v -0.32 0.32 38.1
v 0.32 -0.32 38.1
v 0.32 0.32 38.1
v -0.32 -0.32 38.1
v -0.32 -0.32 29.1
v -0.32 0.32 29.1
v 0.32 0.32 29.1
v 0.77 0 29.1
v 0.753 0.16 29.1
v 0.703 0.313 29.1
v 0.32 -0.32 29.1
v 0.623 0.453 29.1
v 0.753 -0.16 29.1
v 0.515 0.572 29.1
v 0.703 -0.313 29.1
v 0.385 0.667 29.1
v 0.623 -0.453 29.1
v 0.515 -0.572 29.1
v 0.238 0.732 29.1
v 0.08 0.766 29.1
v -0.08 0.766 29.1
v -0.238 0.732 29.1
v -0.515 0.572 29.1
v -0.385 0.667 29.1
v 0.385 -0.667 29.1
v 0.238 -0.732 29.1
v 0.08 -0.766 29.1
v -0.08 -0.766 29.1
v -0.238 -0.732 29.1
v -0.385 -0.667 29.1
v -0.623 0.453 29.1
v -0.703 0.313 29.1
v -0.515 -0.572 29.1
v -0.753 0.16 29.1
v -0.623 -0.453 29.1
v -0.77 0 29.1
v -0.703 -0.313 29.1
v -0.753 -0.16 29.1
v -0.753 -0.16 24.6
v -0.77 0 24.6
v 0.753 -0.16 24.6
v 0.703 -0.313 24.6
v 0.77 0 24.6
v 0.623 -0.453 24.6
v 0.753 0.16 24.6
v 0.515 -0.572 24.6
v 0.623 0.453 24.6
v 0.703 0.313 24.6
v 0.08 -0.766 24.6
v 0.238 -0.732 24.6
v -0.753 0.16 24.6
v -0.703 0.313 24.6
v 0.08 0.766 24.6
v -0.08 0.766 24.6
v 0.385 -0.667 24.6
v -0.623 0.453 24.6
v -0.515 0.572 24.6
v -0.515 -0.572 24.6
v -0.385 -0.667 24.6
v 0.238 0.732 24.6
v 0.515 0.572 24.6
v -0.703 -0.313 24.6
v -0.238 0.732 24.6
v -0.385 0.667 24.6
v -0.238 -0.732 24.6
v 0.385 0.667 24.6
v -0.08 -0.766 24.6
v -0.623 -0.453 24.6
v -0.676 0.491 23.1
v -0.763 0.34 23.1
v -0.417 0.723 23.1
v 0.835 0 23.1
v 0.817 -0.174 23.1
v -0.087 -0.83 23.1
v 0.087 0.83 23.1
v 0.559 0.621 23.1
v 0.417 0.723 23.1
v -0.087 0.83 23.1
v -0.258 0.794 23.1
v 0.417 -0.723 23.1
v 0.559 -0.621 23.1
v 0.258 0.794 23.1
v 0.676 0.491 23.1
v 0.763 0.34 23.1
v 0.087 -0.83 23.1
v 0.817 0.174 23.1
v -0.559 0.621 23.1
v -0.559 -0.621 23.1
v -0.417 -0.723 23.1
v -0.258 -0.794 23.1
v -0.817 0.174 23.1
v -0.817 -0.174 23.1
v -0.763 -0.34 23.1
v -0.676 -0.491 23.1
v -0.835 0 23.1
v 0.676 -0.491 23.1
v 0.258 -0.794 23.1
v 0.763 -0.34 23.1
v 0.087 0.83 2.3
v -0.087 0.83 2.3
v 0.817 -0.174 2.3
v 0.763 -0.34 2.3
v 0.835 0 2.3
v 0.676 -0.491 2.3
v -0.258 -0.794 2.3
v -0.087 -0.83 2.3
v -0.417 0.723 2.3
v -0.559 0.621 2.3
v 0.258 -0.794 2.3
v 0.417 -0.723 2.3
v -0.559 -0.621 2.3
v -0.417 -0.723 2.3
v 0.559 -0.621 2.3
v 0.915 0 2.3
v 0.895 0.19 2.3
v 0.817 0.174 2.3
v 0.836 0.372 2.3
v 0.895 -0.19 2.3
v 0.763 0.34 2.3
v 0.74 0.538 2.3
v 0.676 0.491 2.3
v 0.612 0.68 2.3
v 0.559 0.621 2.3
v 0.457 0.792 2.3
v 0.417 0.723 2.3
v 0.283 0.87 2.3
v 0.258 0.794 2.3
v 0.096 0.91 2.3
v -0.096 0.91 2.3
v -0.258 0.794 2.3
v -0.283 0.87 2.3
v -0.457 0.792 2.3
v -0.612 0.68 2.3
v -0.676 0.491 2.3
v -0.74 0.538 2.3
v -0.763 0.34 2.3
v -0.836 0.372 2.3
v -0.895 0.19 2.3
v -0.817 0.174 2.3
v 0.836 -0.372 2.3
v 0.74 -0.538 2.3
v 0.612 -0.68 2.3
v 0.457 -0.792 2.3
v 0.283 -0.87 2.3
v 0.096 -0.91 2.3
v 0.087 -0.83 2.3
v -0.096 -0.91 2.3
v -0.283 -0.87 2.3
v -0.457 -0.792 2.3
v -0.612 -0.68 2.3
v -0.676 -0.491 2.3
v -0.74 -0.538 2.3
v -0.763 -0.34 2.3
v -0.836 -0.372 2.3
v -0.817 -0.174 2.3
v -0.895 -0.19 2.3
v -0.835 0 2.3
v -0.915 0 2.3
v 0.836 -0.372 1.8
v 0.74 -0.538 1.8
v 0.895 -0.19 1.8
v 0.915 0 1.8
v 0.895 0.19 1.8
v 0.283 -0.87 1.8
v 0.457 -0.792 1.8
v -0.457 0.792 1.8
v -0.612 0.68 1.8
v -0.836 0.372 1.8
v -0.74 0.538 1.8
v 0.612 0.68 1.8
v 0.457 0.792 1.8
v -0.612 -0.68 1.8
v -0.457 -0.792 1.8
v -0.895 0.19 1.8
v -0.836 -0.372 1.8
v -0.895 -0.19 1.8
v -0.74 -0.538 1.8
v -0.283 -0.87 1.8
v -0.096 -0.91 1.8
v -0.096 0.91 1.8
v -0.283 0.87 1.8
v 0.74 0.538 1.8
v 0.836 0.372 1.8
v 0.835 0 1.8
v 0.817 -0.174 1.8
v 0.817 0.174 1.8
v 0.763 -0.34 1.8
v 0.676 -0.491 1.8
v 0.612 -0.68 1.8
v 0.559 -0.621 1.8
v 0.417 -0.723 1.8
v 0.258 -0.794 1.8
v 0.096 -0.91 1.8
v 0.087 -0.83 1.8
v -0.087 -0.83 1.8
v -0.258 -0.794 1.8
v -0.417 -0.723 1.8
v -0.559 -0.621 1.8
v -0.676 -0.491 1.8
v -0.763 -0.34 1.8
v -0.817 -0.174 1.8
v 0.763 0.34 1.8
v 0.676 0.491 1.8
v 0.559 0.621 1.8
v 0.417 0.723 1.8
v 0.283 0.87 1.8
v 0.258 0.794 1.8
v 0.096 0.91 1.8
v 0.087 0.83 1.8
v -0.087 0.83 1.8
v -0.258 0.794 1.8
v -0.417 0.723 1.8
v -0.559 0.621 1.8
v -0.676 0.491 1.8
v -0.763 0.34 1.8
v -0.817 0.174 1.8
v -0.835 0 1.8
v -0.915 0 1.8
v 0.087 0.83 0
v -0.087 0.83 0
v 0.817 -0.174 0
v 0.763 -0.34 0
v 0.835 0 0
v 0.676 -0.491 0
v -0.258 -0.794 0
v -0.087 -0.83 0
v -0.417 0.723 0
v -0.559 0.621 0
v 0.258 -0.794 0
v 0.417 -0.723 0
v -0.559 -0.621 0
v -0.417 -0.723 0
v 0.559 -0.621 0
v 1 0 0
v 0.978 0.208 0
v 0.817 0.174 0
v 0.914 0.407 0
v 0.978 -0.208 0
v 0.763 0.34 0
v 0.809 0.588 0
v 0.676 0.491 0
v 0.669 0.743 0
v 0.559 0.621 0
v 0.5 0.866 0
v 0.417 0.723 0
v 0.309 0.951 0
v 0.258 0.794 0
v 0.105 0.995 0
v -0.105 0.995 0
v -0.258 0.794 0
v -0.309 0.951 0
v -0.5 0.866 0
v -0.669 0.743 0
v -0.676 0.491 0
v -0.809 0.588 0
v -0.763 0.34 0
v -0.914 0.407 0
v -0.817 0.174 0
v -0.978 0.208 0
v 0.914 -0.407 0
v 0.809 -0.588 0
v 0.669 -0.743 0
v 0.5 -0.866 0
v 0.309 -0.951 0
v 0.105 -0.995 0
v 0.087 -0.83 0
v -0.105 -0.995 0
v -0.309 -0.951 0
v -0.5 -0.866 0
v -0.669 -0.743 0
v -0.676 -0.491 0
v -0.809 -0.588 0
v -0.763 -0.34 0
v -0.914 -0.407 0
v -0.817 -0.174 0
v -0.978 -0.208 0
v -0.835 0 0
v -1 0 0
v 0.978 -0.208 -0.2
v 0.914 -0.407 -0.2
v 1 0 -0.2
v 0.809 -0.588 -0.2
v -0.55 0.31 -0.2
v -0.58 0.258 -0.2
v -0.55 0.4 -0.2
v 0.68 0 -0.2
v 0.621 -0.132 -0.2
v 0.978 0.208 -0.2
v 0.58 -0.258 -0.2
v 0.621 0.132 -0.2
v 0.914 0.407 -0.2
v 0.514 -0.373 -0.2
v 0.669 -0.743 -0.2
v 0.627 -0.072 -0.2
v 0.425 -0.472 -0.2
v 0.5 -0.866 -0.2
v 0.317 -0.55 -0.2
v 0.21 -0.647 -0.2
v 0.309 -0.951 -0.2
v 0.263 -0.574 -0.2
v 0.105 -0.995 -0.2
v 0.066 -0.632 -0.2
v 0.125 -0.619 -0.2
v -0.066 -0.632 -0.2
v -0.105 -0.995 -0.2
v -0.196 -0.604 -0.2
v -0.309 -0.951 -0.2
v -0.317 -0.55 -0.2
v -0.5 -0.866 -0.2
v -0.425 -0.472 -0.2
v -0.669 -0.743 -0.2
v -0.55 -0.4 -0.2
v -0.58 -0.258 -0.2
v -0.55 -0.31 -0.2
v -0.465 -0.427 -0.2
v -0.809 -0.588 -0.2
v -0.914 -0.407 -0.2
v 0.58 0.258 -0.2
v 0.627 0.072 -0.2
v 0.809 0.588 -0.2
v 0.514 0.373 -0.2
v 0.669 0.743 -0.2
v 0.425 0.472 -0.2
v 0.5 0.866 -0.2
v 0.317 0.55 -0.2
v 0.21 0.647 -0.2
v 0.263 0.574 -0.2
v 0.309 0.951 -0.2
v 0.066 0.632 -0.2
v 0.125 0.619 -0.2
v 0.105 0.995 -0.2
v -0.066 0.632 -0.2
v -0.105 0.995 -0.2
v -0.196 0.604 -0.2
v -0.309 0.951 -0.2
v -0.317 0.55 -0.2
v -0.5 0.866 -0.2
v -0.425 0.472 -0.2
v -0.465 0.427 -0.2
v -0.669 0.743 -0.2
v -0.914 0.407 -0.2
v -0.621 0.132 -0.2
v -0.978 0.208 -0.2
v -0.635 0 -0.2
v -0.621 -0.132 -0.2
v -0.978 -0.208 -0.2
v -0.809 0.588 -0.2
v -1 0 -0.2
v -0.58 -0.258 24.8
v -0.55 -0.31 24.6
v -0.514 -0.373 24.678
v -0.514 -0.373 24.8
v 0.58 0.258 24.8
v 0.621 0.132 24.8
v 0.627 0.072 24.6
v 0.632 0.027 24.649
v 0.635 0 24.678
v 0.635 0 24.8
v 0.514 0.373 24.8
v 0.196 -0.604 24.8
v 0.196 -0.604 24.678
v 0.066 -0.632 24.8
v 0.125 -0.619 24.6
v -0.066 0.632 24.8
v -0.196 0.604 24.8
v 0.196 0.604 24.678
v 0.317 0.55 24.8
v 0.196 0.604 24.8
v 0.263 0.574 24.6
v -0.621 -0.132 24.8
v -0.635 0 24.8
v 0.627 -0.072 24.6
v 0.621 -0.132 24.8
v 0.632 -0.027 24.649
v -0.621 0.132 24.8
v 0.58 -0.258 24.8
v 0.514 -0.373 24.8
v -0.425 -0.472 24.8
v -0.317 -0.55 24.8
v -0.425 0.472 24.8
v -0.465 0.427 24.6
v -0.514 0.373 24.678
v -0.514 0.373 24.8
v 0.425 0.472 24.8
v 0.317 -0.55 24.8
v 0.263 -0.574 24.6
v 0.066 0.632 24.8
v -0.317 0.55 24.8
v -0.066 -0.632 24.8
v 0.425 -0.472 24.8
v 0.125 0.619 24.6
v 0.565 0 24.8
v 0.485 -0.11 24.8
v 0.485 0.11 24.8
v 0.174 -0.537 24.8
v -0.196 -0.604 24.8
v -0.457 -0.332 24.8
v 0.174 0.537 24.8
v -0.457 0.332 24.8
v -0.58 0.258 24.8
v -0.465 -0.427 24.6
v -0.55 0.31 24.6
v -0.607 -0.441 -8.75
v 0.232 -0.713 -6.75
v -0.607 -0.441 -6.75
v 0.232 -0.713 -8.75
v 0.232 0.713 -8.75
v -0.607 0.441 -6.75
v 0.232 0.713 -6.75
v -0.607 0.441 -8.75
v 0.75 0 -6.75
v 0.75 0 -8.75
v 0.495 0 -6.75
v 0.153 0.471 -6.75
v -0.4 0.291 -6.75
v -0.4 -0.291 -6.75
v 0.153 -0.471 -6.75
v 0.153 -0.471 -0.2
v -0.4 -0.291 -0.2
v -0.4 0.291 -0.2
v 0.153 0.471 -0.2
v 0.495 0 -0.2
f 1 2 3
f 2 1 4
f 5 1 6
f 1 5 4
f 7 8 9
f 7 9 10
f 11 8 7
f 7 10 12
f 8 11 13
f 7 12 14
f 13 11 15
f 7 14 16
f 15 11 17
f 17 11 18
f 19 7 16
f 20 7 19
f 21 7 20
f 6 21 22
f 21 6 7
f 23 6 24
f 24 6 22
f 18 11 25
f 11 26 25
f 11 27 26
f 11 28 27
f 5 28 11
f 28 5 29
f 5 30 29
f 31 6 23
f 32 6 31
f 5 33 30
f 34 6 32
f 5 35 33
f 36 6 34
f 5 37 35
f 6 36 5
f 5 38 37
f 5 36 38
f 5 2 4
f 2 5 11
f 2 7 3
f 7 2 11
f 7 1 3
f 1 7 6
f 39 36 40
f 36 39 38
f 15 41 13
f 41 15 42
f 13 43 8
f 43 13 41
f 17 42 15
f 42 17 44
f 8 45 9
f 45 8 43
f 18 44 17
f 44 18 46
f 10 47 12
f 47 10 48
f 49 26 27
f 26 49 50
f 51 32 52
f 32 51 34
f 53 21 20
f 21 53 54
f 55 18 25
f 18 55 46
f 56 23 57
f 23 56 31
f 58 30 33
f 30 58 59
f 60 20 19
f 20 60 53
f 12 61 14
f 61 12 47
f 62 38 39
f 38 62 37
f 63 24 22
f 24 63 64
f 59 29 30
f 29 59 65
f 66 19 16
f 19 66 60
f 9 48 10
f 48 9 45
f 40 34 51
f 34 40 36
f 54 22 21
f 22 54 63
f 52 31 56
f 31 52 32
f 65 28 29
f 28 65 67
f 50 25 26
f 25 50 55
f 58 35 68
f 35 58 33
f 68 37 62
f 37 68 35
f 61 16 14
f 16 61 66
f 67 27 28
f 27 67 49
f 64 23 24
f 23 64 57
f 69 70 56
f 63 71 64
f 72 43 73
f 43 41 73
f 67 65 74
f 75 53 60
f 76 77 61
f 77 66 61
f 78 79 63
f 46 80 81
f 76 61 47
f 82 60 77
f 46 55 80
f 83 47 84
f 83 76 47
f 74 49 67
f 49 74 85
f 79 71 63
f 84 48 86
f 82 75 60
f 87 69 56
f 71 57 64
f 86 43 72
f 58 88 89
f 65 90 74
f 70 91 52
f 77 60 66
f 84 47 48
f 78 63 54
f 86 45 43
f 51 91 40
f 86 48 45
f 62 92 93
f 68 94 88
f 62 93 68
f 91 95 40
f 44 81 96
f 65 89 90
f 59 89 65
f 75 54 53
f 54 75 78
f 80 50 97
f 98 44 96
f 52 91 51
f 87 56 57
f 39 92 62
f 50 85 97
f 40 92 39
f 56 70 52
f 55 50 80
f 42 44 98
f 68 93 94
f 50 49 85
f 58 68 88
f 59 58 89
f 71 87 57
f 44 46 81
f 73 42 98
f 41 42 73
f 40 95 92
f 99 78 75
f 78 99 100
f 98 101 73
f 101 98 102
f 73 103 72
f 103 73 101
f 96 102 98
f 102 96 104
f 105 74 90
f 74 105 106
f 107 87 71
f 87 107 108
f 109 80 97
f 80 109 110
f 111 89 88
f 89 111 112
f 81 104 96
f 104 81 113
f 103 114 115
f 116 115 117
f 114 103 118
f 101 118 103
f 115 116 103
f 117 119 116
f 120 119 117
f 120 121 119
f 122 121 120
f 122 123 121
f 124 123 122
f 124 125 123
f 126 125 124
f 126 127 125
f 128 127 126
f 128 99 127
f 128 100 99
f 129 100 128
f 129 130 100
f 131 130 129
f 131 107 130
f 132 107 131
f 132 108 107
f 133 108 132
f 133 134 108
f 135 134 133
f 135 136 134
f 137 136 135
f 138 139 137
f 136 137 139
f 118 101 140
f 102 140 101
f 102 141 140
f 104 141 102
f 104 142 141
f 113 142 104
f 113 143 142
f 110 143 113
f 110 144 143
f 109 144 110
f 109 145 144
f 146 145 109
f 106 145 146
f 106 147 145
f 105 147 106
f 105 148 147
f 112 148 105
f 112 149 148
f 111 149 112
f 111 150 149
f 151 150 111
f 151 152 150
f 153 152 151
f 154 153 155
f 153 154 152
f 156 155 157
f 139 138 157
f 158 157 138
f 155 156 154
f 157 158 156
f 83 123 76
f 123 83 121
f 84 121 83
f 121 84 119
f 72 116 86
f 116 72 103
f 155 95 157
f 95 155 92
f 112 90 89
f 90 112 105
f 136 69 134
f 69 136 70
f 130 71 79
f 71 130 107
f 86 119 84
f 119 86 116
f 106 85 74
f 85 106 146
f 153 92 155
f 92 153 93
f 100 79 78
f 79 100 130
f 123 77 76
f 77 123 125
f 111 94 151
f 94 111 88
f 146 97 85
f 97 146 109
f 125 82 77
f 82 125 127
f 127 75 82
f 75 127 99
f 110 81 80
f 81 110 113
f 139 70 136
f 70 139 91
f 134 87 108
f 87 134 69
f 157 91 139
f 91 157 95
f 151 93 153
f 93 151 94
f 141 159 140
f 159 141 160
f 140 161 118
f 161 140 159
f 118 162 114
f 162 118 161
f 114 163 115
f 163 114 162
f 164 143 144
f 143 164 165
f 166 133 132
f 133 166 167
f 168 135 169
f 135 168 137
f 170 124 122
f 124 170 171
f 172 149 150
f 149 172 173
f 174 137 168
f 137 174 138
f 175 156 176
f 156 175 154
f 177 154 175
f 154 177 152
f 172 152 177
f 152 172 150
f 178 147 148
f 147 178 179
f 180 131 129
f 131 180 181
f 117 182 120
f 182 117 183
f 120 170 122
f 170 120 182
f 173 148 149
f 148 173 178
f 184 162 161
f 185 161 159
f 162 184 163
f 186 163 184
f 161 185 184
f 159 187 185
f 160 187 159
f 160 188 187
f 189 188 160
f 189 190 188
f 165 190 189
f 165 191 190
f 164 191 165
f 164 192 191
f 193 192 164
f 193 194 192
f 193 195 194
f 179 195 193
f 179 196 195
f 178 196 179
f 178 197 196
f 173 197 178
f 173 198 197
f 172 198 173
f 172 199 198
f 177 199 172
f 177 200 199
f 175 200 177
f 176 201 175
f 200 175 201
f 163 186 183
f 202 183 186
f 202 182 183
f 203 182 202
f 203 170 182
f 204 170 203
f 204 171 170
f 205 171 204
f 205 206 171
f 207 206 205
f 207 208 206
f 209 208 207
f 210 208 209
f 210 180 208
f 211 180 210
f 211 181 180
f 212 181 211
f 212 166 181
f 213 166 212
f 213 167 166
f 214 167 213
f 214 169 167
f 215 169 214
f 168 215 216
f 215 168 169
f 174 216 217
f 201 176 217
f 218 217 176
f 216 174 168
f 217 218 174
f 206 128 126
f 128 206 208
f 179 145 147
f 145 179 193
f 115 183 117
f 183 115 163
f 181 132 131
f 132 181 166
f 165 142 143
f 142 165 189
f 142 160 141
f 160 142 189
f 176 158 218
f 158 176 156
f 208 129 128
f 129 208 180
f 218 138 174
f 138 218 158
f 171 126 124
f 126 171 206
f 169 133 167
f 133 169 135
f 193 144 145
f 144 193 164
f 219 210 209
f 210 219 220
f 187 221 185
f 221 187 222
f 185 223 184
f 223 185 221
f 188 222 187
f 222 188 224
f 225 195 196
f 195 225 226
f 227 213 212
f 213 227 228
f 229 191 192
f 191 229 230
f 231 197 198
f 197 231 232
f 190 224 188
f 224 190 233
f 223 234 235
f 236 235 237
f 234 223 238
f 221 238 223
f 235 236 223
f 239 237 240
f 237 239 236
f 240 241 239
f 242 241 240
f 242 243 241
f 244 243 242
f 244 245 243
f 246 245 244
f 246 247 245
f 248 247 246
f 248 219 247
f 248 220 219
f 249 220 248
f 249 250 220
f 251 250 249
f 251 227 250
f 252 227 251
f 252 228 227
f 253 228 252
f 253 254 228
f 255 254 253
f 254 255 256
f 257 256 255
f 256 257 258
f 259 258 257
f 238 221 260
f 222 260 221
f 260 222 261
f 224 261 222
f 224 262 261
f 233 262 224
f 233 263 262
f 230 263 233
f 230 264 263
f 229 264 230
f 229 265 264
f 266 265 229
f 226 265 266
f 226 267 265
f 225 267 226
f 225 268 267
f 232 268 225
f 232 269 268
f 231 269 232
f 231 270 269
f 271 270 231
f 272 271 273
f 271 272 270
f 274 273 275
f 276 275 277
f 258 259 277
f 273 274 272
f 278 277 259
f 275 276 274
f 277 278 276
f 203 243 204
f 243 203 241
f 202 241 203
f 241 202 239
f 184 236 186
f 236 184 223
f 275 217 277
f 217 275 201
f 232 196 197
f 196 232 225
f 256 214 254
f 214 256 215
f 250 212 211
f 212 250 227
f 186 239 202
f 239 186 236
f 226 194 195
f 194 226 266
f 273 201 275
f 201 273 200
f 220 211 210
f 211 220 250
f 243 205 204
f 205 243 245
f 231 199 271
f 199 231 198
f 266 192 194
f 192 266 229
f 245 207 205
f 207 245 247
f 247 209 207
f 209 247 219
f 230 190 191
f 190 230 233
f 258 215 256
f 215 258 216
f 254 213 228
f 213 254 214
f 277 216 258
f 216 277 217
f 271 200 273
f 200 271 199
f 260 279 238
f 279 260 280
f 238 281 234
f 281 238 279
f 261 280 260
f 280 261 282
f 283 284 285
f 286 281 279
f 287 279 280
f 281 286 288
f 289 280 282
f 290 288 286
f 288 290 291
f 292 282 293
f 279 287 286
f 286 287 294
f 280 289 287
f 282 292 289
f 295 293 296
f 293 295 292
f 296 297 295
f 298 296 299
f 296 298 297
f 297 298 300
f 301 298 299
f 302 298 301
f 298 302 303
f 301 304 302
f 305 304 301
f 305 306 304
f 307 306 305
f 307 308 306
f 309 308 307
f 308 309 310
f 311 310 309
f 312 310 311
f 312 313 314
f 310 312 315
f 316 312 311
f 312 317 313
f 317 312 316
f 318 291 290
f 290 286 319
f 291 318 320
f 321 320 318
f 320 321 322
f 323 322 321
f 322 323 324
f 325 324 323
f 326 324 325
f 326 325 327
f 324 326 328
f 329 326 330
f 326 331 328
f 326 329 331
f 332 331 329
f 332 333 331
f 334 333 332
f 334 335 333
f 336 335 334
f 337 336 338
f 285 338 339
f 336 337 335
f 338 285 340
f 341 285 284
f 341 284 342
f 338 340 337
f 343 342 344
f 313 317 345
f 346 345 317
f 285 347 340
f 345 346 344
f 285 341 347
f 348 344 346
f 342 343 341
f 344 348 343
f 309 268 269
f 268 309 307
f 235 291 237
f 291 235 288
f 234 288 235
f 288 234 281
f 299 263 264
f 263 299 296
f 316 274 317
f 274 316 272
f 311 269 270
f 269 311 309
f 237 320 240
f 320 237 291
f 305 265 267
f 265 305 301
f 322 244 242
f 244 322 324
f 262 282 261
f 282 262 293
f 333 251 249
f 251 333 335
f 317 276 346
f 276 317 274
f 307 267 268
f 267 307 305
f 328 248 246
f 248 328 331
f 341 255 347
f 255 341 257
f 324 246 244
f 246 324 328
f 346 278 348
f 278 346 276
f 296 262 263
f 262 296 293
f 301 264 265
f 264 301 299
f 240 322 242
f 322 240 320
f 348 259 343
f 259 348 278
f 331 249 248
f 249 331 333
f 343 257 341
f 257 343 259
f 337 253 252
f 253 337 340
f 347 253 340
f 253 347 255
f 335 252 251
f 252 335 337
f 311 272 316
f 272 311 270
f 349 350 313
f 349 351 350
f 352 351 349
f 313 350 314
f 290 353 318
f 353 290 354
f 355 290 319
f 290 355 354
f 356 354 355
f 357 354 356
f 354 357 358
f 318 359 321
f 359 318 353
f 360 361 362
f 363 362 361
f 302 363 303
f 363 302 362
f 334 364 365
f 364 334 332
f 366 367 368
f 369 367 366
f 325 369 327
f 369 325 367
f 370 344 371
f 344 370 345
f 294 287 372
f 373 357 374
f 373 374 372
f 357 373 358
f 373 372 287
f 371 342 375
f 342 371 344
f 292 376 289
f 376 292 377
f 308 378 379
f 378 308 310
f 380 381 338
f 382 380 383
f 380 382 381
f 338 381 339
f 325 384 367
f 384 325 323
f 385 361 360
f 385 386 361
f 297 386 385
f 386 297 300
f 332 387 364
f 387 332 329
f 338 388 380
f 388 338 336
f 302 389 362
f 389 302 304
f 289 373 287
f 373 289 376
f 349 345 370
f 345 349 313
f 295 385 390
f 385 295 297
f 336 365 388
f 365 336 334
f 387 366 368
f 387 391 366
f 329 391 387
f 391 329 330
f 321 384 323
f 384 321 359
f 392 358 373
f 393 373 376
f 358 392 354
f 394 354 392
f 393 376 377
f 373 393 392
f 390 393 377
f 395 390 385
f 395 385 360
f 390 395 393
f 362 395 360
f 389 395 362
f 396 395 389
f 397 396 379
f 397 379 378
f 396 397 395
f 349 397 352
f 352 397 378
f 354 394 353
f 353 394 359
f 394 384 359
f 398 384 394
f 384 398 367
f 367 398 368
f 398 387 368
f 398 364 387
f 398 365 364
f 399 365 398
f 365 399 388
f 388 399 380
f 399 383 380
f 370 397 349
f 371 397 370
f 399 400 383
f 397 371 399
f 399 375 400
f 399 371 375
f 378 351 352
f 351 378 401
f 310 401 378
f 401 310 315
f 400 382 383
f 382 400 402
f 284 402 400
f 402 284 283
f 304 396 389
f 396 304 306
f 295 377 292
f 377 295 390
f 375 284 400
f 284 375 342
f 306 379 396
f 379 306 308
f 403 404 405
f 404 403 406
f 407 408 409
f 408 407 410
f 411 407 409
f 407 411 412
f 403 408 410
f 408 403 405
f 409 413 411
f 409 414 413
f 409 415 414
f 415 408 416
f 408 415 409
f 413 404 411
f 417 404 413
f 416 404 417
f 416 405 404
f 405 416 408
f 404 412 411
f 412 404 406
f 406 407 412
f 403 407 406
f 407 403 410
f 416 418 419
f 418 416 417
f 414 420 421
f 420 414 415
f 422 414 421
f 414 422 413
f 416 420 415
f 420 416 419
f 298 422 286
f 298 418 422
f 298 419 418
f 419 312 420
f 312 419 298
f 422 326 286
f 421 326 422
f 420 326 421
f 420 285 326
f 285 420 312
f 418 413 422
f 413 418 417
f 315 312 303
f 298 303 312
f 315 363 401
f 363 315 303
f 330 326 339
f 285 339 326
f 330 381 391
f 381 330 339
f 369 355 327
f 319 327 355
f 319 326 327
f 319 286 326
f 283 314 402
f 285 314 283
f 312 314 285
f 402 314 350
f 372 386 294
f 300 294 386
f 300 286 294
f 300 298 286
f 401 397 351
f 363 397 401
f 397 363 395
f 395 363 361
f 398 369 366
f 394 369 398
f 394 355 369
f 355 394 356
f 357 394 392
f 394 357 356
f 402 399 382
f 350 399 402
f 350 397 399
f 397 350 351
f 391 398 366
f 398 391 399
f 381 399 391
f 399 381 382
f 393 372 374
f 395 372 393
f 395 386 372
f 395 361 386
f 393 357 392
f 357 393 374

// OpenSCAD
// file: P100.scad
module P100() {
   /* Flat Top */
    head_diameter = 1.5;
    head_height = 2;
    top_shaft_diameter = 0.99;
    body_shaft_diameter = 1.36;
    body_shaft_length = 24.8;
    total_length = 33.35;
    top_shaft_length = total_length-body_shaft_length-head_height;
    
    color("Silver")
    translate([0,0,head_height/2])cylinder(d=head_diameter, h=head_height, center=true);
    
    color("Silver")
    translate([0,0,head_height])cylinder(d=top_shaft_diameter, h=top_shaft_length);
    
    color("Gold")
    translate([0,0,head_height+top_shaft_length])cylinder(h=body_shaft_length, d=body_shaft_diameter);
    
    color("Gold")
    translate([0,0,head_height+top_shaft_length+body_shaft_length])sphere(d=body_shaft_diameter);
}

P100();
// file: ../sockets/R100_2W.scad
/* [Dimensions] */
base_length = 9;
base_side = 0.64;
crimp_diameter = 1.54;
crimp_length = 4.5;
taper_length = 1.5;
shaft_diameter = 1.67;
total_length = 38.3;
top_ring_length = 0.2;
top_ring_diameter = 2;
bottom_ring_length = 0.5;
bottom_ring_diameter = 1.83;
ring_separation = 2.5;

/* [Variables] */
through_all_height = 1000;


module R100_2W_frame(){
    /*
    Square base
    Crimped section connecting the shaft to the base
    Tapered section expanding to the shaft thickness
    cylindrical shaft
    Bottom ring
    shaft
    top ring
    
    linearly extrude from the base.
    */
    translate([0,0,total_length]) {
    rotate(180, [1, 0, 0]) {
    
    // z=0
    linear_extrude(base_length)
        square(base_side, center=true);
    
    // crimp
    //z=base_length
    translate([0,0,base_length])cylinder(crimp_length, d=crimp_diameter,center=false);
    
    //  taper
    // z=base_length+crimp_length
    translate([0,0,base_length+crimp_length])cylinder(taper_length, d2=shaft_diameter, d1=crimp_diameter ,center=false);

    //  bottom shaft    
    // z=base_length+crimp_length+taper_length
    bottom_shaft_length=total_length-(taper_length+base_length+crimp_length+ring_separation);
     
    //assert(bottom_shaft_length==20.8);
    translate([0,0,base_length+crimp_length+taper_length])cylinder(bottom_shaft_length, d=shaft_diameter,center=false);
    
    //  bottom ring
    // z=base_length+crimp_length+taper_length + bottom_shaft_length
    translate([0,0,base_length+crimp_length+taper_length+bottom_shaft_length])cylinder(bottom_ring_length, d=bottom_ring_diameter,center=false);
    
    //  ring separation shaft
    //  z=base_length+crimp_length+taper_length + bottom_shaft_length+bottom_ring_length
    //  ring_separation is bottom of bottom to top of top

    ring_separation_shaft_length = ring_separation-top_ring_length-bottom_ring_length;
    translate([0,0,base_length+crimp_length+taper_length+bottom_shaft_length+bottom_ring_length])cylinder(ring_separation_shaft_length, d=shaft_diameter,center=false);
    
    
    // top ring
    //z=base_length+crimp_length+taper_length + bottom_shaft_length+ring_separation-bottom_ring_length-top_ring_length
    translate([0,0,total_length-top_ring_length])cylinder(top_ring_length, d=top_ring_diameter,center=false);
    
    //color("yellow")
    //translate([0,0,7.8+7.62])cylinder(h=1,d=1.46,center=false);
    z=base_length+crimp_length+taper_length + bottom_shaft_length+ring_separation;
    };
    };
}

module R100_2W(){
    //  Put hole in model
    translate([0,0,-top_ring_length])
    difference(){
        R100_2W_frame();
        hole_depth=25;
        cylinder(d=1.27, h=2*hole_depth, center=true);
    };
}


module R100_2W_pinhole() {
    ate_shaft_diameter = shaft_diameter;
    ate_bottom_lip_diameter = bottom_ring_diameter;
    ate_top_lip_diameter = top_ring_diameter;
    ate_lip_separation = ring_separation; //  center to center
   
    hole_size_margin = 0.1;
    shaft_hole_diameter = ate_shaft_diameter + hole_size_margin;
    bottom_lip_hole_diameter = ate_bottom_lip_diameter + hole_size_margin;
    top_lip_hole_diameter = ate_top_lip_diameter + hole_size_margin;
    
    //  through all holes, is symetrical and large
    cylinder(h=through_all_height, d=shaft_hole_diameter, center=true);
    
    //  top dimple wider bore, starts from the depth passed in and cuts up
    top_counter_bore_depth = 0;  //  tell the function where we want to top of the pin to be
    translate([0, 0, top_counter_bore_depth])cylinder(h=through_all_height, d=top_lip_hole_diameter, center=false);

    //  bottom dimple narrower bore, starts from the depth of the upper minus the separation
    bottom_counter_bore_depth = -ate_lip_separation;
    translate([0, 0, bottom_counter_bore_depth])cylinder(h=through_all_height, d=bottom_lip_hole_diameter, center=false);
};

$fs=0.1;
R100_2W();
//R100_2W_pinhole();
// main file
use<../sockets/R100_2W.scad>;
use<P100.scad>

module P100_R100_2W() {
    translate([0,0,0])R100_2W();
    translate([0,0,-8.75])P100();
}
P100_R100_2W();
